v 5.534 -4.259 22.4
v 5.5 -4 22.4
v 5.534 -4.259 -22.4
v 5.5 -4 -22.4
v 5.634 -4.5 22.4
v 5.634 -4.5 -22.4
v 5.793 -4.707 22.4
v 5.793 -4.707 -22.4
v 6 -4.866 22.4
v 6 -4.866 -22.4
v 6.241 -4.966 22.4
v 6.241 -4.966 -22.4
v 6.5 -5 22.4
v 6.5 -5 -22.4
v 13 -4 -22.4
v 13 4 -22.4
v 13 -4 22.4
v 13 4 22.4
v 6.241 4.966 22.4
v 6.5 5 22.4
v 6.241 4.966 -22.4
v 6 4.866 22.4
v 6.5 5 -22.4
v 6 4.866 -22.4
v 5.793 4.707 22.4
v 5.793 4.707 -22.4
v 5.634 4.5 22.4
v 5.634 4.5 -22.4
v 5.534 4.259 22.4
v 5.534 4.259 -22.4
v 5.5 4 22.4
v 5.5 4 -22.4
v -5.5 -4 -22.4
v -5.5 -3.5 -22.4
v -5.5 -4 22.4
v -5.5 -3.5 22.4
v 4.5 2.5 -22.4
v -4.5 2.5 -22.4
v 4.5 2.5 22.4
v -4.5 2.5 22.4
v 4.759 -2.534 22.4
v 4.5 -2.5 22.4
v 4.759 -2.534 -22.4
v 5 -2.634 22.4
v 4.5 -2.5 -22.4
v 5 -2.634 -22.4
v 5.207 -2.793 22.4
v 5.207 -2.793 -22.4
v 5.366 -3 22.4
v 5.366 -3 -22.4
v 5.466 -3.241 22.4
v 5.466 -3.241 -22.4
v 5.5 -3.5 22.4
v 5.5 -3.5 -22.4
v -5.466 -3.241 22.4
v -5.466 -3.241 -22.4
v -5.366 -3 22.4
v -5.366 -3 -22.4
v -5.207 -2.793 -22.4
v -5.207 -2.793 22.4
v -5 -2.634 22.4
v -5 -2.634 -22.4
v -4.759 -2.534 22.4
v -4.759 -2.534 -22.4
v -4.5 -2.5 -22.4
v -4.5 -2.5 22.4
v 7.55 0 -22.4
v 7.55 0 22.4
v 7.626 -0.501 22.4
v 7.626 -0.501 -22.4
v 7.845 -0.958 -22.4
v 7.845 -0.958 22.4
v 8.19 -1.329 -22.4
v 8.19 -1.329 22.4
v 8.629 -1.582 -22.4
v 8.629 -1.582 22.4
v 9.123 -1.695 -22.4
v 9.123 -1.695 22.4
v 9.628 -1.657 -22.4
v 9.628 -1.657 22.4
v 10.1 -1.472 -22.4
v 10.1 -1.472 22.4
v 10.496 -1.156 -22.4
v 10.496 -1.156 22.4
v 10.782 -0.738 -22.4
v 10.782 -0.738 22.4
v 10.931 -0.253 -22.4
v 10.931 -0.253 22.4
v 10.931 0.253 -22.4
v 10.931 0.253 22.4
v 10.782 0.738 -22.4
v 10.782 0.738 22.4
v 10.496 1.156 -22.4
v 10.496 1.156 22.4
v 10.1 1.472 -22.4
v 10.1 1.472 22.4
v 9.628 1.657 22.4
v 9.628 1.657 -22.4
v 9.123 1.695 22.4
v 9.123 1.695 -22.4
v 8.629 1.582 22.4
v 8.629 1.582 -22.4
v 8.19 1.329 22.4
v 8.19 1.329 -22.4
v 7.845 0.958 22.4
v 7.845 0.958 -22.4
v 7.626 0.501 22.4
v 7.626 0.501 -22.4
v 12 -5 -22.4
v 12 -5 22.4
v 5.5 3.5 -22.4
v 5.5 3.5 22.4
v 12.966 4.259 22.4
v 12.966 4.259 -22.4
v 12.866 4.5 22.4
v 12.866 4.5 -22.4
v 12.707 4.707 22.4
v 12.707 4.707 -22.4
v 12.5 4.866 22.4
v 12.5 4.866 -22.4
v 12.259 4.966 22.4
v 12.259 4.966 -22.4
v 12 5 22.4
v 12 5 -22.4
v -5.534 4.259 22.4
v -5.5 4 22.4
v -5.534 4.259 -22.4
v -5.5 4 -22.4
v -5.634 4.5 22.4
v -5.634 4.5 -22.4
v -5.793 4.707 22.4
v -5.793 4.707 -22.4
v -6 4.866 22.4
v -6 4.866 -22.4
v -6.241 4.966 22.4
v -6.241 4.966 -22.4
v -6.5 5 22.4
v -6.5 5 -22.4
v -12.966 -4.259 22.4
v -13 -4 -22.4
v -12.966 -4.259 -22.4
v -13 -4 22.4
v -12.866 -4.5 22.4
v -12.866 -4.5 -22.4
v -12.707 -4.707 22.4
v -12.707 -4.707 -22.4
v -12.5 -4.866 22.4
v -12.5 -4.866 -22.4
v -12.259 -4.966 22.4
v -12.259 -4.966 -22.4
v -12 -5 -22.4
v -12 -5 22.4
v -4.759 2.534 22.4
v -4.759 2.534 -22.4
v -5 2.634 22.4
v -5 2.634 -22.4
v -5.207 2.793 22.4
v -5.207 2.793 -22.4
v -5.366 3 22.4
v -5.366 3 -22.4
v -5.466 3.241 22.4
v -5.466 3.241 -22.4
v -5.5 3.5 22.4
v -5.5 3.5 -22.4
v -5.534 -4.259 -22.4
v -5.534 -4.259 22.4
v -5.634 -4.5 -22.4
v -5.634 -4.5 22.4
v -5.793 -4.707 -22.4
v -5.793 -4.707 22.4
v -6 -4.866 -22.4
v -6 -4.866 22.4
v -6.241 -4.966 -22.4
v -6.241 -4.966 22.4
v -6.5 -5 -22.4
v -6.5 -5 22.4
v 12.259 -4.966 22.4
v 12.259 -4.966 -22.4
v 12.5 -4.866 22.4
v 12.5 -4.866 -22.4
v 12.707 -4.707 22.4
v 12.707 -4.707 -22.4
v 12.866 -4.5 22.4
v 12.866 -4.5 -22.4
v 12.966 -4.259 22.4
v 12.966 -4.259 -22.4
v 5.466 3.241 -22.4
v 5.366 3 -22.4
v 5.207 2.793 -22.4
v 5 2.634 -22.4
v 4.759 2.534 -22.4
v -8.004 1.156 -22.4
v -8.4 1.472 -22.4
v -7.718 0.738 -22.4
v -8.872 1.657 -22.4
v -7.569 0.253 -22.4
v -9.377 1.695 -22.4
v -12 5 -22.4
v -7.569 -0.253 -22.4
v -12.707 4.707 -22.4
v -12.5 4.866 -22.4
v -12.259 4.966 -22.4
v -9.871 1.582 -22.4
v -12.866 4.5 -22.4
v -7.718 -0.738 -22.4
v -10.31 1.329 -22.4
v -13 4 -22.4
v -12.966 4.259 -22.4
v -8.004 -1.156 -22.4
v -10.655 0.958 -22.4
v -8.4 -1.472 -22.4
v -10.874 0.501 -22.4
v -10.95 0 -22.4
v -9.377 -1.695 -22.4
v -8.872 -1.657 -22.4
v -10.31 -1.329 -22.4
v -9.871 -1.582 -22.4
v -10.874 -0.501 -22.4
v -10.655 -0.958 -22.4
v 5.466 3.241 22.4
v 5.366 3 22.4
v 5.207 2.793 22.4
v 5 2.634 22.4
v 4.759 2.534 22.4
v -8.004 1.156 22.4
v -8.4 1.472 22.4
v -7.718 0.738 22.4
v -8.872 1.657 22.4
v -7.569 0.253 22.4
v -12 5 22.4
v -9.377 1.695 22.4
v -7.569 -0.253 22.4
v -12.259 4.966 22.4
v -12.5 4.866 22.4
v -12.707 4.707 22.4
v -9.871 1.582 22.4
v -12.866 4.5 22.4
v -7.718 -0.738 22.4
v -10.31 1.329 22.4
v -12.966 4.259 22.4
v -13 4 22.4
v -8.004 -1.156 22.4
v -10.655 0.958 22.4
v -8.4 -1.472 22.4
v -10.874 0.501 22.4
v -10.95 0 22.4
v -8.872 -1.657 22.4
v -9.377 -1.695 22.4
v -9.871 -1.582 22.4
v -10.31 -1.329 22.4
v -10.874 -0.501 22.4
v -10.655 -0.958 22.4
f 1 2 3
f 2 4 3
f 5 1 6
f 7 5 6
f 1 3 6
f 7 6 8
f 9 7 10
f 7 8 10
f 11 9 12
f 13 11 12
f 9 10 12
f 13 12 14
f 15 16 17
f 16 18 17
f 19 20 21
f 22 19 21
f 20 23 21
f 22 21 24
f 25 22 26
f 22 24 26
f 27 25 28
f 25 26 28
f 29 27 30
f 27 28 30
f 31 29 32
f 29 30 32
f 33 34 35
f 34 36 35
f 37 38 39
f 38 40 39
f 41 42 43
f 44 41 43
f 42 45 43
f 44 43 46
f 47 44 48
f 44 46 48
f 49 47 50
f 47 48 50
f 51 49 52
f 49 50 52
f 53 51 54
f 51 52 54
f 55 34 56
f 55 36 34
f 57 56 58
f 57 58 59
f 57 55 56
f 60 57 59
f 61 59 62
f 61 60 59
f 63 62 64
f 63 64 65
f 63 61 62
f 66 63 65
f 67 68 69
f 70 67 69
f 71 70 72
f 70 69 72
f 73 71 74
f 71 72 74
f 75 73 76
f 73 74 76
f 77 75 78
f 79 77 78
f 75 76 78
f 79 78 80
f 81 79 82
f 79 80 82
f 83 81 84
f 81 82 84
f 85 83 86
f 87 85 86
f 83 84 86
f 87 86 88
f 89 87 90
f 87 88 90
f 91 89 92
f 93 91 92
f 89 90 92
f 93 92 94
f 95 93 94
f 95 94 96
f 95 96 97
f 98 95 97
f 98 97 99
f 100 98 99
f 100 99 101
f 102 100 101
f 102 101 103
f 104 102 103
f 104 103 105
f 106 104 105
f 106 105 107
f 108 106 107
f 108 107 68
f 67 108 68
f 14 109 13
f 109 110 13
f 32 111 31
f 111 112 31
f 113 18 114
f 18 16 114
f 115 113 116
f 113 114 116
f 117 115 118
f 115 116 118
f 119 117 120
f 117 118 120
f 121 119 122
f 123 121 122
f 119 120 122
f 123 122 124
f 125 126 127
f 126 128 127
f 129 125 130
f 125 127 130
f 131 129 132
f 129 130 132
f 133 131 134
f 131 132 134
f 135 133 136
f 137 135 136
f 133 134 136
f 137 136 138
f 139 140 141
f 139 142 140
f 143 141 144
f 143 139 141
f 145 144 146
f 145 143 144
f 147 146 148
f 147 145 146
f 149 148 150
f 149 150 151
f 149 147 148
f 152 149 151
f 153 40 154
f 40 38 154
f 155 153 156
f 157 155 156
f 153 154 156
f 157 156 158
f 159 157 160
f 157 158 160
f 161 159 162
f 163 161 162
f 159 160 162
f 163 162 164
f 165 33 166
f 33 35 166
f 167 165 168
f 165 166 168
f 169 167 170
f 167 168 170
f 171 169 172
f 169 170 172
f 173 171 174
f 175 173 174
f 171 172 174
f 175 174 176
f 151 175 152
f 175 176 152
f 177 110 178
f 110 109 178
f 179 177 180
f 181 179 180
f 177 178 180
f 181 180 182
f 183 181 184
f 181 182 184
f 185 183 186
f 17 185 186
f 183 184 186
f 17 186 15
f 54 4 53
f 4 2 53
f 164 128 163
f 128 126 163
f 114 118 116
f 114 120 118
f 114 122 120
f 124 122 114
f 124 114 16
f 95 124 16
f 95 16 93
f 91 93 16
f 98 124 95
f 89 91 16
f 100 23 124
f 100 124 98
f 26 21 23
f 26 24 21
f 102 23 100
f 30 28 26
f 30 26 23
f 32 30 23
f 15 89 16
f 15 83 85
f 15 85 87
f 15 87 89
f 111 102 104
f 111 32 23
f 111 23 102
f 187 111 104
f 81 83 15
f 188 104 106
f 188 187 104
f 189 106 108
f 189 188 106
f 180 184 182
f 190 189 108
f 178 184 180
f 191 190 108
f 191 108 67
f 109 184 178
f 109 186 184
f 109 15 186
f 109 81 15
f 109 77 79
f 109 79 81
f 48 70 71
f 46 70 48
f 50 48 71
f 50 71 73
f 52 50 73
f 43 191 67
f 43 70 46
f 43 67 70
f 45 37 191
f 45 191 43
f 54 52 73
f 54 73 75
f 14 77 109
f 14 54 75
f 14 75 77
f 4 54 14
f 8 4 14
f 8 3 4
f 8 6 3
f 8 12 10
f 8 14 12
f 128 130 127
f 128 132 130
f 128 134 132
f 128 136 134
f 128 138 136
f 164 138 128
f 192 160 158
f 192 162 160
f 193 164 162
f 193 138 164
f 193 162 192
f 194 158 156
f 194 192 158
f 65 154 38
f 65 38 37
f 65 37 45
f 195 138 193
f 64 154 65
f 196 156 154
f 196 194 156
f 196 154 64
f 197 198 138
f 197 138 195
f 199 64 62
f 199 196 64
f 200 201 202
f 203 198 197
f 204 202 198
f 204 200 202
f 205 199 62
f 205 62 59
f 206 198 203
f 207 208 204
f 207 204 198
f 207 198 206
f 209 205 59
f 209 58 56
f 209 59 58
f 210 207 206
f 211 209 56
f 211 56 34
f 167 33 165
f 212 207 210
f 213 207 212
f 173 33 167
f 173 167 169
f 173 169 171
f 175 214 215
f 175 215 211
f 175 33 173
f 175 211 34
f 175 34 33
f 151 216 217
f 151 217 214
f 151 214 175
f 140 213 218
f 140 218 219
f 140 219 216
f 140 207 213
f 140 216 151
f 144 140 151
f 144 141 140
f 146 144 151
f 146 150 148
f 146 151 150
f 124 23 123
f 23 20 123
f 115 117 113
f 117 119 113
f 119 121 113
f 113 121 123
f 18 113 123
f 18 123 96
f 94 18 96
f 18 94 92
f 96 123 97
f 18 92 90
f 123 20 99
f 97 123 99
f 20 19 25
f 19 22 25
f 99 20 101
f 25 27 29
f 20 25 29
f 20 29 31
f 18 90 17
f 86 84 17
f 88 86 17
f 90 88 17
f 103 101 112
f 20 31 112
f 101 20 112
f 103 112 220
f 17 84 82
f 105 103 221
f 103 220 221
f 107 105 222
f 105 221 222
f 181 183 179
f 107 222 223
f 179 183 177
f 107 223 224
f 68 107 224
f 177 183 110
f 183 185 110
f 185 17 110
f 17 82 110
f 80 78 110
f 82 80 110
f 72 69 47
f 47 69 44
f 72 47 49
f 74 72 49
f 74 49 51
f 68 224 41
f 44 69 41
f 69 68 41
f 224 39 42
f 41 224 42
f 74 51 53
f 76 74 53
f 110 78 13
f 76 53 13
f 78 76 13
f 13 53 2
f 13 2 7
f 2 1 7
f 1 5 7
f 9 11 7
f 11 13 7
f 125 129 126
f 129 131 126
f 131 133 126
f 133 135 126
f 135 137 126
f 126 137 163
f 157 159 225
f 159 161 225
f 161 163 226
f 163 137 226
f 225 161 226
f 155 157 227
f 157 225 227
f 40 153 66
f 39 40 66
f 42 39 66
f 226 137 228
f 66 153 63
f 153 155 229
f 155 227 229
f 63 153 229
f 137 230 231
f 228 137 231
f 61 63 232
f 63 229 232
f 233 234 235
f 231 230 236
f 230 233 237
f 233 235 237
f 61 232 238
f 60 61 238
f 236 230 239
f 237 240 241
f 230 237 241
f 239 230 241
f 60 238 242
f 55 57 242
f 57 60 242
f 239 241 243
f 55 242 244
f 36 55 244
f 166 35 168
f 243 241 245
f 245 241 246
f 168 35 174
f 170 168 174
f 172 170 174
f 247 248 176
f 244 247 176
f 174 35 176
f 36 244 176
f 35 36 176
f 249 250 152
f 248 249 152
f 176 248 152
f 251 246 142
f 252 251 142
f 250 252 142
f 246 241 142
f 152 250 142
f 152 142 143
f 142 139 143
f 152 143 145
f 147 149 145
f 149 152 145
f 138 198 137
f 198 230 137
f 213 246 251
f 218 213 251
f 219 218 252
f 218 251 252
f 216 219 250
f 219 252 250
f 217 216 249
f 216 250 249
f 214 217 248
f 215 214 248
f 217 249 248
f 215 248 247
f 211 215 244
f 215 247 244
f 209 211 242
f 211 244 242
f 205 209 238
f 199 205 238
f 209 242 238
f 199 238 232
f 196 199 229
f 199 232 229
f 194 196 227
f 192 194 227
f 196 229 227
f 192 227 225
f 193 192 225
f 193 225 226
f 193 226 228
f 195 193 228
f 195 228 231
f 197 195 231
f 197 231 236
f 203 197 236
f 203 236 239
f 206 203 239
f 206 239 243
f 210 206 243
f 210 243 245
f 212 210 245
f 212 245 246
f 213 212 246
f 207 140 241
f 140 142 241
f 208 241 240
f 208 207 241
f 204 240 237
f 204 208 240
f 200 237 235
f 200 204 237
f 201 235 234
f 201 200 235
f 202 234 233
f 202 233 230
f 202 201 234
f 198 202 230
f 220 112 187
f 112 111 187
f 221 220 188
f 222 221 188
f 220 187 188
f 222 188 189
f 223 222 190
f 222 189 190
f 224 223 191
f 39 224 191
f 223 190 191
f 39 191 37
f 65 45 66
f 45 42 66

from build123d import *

# Parameters (mm, degrees)
SALIENTE_EXTRUIR1_DEPTH      = 22.4
REDONDEO1_R                  = 1
TALADRO_DE_MARGEN_PARA_M31_D = 3.4


with BuildPart() as part:
    # Croquis1 → Saliente-Extruir1 (new, symmetric)
    with BuildSketch(Plane(origin=(0, 0, 0), x_dir=(0, 1, 0), z_dir=(0, 0, 1))):
        Polygon((-5, 13), (5, 13), (5, 5.5), (2.5, 5.5), (2.5, -5.5), (5, -5.5), (5, -13), (-5, -13), (-5, -5.5), (-2.5, -5.5), (-2.5, 5.5), (-5, 5.5), align=None)
    extrude(amount=SALIENTE_EXTRUIR1_DEPTH, both=True)

    # Redondeo1
    redondeo1_edges = [part.edges().sort_by_distance(p)[0] for p in [
        (-5.5, -5, 0),
        (-13, -5, 0),
        (-13, 5, 0),
        (-5.5, 5, 0),
        (-5.5, 2.5, 0),
        (5.5, 2.5, 0),
        (5.5, 5, 0),
        (13, 5, 0),
        (13, -5, 0),
        (5.5, -5, 0),
        (5.5, -2.5, 0),
        (-5.5, -2.5, 0),
    ]]
    fillet(redondeo1_edges, radius=REDONDEO1_R)

    # Taladro de margen para M31 (through all)
    with Locations(Plane(origin=(0, 0, -22.4), x_dir=(1, 0, 0), z_dir=(0, 0, -1))):
        with Locations((9.25, 0), (-9.25, 0)):
            Hole(TALADRO_DE_MARGEN_PARA_M31_D / 2)


solid = part.part
